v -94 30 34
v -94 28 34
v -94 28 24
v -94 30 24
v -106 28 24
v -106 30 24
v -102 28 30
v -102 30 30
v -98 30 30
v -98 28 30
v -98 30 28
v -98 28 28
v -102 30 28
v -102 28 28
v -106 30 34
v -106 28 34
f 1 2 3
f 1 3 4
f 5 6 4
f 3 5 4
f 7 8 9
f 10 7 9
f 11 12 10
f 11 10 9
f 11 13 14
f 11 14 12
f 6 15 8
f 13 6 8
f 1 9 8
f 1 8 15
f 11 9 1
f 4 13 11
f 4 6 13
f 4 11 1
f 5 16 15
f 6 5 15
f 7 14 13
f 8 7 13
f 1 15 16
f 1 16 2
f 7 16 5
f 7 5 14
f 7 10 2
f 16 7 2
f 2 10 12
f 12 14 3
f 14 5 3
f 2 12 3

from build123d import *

# Parameters (mm, degrees)
BOX013_W     = 4
BOX013_H     = 2
BOX013_DEPTH = 2
BOX012_W     = 12
BOX012_H     = 2
BOX012_DEPTH = 10


with BuildPart() as cube011:
    # Box013 → Box013 (new body)
    with BuildSketch(Plane(origin=(4, 0, 30), x_dir=(1, 0, 0), z_dir=(0, 0, 1))):
        with Locations((2, 1)):
            Rectangle(BOX013_W, BOX013_H)
    extrude(amount=BOX013_DEPTH)


with BuildPart() as wireharnestiepoint:
    # Box012 → Box012 (new body)
    with BuildSketch(Plane.XY.offset(26)):
        with Locations((6, 1)):
            Rectangle(BOX012_W, BOX012_H)
    extrude(amount=BOX012_DEPTH)

    # Cut005: cut Cube011
    add(cube011.part, mode=Mode.SUBTRACT)


with BuildPart() as wireharnestiepoint_1:
    # Cut005 placement: moved
    add(wireharnestiepoint.part.moved(Location((-106, 28, -2))))


solid = wireharnestiepoint_1.part
